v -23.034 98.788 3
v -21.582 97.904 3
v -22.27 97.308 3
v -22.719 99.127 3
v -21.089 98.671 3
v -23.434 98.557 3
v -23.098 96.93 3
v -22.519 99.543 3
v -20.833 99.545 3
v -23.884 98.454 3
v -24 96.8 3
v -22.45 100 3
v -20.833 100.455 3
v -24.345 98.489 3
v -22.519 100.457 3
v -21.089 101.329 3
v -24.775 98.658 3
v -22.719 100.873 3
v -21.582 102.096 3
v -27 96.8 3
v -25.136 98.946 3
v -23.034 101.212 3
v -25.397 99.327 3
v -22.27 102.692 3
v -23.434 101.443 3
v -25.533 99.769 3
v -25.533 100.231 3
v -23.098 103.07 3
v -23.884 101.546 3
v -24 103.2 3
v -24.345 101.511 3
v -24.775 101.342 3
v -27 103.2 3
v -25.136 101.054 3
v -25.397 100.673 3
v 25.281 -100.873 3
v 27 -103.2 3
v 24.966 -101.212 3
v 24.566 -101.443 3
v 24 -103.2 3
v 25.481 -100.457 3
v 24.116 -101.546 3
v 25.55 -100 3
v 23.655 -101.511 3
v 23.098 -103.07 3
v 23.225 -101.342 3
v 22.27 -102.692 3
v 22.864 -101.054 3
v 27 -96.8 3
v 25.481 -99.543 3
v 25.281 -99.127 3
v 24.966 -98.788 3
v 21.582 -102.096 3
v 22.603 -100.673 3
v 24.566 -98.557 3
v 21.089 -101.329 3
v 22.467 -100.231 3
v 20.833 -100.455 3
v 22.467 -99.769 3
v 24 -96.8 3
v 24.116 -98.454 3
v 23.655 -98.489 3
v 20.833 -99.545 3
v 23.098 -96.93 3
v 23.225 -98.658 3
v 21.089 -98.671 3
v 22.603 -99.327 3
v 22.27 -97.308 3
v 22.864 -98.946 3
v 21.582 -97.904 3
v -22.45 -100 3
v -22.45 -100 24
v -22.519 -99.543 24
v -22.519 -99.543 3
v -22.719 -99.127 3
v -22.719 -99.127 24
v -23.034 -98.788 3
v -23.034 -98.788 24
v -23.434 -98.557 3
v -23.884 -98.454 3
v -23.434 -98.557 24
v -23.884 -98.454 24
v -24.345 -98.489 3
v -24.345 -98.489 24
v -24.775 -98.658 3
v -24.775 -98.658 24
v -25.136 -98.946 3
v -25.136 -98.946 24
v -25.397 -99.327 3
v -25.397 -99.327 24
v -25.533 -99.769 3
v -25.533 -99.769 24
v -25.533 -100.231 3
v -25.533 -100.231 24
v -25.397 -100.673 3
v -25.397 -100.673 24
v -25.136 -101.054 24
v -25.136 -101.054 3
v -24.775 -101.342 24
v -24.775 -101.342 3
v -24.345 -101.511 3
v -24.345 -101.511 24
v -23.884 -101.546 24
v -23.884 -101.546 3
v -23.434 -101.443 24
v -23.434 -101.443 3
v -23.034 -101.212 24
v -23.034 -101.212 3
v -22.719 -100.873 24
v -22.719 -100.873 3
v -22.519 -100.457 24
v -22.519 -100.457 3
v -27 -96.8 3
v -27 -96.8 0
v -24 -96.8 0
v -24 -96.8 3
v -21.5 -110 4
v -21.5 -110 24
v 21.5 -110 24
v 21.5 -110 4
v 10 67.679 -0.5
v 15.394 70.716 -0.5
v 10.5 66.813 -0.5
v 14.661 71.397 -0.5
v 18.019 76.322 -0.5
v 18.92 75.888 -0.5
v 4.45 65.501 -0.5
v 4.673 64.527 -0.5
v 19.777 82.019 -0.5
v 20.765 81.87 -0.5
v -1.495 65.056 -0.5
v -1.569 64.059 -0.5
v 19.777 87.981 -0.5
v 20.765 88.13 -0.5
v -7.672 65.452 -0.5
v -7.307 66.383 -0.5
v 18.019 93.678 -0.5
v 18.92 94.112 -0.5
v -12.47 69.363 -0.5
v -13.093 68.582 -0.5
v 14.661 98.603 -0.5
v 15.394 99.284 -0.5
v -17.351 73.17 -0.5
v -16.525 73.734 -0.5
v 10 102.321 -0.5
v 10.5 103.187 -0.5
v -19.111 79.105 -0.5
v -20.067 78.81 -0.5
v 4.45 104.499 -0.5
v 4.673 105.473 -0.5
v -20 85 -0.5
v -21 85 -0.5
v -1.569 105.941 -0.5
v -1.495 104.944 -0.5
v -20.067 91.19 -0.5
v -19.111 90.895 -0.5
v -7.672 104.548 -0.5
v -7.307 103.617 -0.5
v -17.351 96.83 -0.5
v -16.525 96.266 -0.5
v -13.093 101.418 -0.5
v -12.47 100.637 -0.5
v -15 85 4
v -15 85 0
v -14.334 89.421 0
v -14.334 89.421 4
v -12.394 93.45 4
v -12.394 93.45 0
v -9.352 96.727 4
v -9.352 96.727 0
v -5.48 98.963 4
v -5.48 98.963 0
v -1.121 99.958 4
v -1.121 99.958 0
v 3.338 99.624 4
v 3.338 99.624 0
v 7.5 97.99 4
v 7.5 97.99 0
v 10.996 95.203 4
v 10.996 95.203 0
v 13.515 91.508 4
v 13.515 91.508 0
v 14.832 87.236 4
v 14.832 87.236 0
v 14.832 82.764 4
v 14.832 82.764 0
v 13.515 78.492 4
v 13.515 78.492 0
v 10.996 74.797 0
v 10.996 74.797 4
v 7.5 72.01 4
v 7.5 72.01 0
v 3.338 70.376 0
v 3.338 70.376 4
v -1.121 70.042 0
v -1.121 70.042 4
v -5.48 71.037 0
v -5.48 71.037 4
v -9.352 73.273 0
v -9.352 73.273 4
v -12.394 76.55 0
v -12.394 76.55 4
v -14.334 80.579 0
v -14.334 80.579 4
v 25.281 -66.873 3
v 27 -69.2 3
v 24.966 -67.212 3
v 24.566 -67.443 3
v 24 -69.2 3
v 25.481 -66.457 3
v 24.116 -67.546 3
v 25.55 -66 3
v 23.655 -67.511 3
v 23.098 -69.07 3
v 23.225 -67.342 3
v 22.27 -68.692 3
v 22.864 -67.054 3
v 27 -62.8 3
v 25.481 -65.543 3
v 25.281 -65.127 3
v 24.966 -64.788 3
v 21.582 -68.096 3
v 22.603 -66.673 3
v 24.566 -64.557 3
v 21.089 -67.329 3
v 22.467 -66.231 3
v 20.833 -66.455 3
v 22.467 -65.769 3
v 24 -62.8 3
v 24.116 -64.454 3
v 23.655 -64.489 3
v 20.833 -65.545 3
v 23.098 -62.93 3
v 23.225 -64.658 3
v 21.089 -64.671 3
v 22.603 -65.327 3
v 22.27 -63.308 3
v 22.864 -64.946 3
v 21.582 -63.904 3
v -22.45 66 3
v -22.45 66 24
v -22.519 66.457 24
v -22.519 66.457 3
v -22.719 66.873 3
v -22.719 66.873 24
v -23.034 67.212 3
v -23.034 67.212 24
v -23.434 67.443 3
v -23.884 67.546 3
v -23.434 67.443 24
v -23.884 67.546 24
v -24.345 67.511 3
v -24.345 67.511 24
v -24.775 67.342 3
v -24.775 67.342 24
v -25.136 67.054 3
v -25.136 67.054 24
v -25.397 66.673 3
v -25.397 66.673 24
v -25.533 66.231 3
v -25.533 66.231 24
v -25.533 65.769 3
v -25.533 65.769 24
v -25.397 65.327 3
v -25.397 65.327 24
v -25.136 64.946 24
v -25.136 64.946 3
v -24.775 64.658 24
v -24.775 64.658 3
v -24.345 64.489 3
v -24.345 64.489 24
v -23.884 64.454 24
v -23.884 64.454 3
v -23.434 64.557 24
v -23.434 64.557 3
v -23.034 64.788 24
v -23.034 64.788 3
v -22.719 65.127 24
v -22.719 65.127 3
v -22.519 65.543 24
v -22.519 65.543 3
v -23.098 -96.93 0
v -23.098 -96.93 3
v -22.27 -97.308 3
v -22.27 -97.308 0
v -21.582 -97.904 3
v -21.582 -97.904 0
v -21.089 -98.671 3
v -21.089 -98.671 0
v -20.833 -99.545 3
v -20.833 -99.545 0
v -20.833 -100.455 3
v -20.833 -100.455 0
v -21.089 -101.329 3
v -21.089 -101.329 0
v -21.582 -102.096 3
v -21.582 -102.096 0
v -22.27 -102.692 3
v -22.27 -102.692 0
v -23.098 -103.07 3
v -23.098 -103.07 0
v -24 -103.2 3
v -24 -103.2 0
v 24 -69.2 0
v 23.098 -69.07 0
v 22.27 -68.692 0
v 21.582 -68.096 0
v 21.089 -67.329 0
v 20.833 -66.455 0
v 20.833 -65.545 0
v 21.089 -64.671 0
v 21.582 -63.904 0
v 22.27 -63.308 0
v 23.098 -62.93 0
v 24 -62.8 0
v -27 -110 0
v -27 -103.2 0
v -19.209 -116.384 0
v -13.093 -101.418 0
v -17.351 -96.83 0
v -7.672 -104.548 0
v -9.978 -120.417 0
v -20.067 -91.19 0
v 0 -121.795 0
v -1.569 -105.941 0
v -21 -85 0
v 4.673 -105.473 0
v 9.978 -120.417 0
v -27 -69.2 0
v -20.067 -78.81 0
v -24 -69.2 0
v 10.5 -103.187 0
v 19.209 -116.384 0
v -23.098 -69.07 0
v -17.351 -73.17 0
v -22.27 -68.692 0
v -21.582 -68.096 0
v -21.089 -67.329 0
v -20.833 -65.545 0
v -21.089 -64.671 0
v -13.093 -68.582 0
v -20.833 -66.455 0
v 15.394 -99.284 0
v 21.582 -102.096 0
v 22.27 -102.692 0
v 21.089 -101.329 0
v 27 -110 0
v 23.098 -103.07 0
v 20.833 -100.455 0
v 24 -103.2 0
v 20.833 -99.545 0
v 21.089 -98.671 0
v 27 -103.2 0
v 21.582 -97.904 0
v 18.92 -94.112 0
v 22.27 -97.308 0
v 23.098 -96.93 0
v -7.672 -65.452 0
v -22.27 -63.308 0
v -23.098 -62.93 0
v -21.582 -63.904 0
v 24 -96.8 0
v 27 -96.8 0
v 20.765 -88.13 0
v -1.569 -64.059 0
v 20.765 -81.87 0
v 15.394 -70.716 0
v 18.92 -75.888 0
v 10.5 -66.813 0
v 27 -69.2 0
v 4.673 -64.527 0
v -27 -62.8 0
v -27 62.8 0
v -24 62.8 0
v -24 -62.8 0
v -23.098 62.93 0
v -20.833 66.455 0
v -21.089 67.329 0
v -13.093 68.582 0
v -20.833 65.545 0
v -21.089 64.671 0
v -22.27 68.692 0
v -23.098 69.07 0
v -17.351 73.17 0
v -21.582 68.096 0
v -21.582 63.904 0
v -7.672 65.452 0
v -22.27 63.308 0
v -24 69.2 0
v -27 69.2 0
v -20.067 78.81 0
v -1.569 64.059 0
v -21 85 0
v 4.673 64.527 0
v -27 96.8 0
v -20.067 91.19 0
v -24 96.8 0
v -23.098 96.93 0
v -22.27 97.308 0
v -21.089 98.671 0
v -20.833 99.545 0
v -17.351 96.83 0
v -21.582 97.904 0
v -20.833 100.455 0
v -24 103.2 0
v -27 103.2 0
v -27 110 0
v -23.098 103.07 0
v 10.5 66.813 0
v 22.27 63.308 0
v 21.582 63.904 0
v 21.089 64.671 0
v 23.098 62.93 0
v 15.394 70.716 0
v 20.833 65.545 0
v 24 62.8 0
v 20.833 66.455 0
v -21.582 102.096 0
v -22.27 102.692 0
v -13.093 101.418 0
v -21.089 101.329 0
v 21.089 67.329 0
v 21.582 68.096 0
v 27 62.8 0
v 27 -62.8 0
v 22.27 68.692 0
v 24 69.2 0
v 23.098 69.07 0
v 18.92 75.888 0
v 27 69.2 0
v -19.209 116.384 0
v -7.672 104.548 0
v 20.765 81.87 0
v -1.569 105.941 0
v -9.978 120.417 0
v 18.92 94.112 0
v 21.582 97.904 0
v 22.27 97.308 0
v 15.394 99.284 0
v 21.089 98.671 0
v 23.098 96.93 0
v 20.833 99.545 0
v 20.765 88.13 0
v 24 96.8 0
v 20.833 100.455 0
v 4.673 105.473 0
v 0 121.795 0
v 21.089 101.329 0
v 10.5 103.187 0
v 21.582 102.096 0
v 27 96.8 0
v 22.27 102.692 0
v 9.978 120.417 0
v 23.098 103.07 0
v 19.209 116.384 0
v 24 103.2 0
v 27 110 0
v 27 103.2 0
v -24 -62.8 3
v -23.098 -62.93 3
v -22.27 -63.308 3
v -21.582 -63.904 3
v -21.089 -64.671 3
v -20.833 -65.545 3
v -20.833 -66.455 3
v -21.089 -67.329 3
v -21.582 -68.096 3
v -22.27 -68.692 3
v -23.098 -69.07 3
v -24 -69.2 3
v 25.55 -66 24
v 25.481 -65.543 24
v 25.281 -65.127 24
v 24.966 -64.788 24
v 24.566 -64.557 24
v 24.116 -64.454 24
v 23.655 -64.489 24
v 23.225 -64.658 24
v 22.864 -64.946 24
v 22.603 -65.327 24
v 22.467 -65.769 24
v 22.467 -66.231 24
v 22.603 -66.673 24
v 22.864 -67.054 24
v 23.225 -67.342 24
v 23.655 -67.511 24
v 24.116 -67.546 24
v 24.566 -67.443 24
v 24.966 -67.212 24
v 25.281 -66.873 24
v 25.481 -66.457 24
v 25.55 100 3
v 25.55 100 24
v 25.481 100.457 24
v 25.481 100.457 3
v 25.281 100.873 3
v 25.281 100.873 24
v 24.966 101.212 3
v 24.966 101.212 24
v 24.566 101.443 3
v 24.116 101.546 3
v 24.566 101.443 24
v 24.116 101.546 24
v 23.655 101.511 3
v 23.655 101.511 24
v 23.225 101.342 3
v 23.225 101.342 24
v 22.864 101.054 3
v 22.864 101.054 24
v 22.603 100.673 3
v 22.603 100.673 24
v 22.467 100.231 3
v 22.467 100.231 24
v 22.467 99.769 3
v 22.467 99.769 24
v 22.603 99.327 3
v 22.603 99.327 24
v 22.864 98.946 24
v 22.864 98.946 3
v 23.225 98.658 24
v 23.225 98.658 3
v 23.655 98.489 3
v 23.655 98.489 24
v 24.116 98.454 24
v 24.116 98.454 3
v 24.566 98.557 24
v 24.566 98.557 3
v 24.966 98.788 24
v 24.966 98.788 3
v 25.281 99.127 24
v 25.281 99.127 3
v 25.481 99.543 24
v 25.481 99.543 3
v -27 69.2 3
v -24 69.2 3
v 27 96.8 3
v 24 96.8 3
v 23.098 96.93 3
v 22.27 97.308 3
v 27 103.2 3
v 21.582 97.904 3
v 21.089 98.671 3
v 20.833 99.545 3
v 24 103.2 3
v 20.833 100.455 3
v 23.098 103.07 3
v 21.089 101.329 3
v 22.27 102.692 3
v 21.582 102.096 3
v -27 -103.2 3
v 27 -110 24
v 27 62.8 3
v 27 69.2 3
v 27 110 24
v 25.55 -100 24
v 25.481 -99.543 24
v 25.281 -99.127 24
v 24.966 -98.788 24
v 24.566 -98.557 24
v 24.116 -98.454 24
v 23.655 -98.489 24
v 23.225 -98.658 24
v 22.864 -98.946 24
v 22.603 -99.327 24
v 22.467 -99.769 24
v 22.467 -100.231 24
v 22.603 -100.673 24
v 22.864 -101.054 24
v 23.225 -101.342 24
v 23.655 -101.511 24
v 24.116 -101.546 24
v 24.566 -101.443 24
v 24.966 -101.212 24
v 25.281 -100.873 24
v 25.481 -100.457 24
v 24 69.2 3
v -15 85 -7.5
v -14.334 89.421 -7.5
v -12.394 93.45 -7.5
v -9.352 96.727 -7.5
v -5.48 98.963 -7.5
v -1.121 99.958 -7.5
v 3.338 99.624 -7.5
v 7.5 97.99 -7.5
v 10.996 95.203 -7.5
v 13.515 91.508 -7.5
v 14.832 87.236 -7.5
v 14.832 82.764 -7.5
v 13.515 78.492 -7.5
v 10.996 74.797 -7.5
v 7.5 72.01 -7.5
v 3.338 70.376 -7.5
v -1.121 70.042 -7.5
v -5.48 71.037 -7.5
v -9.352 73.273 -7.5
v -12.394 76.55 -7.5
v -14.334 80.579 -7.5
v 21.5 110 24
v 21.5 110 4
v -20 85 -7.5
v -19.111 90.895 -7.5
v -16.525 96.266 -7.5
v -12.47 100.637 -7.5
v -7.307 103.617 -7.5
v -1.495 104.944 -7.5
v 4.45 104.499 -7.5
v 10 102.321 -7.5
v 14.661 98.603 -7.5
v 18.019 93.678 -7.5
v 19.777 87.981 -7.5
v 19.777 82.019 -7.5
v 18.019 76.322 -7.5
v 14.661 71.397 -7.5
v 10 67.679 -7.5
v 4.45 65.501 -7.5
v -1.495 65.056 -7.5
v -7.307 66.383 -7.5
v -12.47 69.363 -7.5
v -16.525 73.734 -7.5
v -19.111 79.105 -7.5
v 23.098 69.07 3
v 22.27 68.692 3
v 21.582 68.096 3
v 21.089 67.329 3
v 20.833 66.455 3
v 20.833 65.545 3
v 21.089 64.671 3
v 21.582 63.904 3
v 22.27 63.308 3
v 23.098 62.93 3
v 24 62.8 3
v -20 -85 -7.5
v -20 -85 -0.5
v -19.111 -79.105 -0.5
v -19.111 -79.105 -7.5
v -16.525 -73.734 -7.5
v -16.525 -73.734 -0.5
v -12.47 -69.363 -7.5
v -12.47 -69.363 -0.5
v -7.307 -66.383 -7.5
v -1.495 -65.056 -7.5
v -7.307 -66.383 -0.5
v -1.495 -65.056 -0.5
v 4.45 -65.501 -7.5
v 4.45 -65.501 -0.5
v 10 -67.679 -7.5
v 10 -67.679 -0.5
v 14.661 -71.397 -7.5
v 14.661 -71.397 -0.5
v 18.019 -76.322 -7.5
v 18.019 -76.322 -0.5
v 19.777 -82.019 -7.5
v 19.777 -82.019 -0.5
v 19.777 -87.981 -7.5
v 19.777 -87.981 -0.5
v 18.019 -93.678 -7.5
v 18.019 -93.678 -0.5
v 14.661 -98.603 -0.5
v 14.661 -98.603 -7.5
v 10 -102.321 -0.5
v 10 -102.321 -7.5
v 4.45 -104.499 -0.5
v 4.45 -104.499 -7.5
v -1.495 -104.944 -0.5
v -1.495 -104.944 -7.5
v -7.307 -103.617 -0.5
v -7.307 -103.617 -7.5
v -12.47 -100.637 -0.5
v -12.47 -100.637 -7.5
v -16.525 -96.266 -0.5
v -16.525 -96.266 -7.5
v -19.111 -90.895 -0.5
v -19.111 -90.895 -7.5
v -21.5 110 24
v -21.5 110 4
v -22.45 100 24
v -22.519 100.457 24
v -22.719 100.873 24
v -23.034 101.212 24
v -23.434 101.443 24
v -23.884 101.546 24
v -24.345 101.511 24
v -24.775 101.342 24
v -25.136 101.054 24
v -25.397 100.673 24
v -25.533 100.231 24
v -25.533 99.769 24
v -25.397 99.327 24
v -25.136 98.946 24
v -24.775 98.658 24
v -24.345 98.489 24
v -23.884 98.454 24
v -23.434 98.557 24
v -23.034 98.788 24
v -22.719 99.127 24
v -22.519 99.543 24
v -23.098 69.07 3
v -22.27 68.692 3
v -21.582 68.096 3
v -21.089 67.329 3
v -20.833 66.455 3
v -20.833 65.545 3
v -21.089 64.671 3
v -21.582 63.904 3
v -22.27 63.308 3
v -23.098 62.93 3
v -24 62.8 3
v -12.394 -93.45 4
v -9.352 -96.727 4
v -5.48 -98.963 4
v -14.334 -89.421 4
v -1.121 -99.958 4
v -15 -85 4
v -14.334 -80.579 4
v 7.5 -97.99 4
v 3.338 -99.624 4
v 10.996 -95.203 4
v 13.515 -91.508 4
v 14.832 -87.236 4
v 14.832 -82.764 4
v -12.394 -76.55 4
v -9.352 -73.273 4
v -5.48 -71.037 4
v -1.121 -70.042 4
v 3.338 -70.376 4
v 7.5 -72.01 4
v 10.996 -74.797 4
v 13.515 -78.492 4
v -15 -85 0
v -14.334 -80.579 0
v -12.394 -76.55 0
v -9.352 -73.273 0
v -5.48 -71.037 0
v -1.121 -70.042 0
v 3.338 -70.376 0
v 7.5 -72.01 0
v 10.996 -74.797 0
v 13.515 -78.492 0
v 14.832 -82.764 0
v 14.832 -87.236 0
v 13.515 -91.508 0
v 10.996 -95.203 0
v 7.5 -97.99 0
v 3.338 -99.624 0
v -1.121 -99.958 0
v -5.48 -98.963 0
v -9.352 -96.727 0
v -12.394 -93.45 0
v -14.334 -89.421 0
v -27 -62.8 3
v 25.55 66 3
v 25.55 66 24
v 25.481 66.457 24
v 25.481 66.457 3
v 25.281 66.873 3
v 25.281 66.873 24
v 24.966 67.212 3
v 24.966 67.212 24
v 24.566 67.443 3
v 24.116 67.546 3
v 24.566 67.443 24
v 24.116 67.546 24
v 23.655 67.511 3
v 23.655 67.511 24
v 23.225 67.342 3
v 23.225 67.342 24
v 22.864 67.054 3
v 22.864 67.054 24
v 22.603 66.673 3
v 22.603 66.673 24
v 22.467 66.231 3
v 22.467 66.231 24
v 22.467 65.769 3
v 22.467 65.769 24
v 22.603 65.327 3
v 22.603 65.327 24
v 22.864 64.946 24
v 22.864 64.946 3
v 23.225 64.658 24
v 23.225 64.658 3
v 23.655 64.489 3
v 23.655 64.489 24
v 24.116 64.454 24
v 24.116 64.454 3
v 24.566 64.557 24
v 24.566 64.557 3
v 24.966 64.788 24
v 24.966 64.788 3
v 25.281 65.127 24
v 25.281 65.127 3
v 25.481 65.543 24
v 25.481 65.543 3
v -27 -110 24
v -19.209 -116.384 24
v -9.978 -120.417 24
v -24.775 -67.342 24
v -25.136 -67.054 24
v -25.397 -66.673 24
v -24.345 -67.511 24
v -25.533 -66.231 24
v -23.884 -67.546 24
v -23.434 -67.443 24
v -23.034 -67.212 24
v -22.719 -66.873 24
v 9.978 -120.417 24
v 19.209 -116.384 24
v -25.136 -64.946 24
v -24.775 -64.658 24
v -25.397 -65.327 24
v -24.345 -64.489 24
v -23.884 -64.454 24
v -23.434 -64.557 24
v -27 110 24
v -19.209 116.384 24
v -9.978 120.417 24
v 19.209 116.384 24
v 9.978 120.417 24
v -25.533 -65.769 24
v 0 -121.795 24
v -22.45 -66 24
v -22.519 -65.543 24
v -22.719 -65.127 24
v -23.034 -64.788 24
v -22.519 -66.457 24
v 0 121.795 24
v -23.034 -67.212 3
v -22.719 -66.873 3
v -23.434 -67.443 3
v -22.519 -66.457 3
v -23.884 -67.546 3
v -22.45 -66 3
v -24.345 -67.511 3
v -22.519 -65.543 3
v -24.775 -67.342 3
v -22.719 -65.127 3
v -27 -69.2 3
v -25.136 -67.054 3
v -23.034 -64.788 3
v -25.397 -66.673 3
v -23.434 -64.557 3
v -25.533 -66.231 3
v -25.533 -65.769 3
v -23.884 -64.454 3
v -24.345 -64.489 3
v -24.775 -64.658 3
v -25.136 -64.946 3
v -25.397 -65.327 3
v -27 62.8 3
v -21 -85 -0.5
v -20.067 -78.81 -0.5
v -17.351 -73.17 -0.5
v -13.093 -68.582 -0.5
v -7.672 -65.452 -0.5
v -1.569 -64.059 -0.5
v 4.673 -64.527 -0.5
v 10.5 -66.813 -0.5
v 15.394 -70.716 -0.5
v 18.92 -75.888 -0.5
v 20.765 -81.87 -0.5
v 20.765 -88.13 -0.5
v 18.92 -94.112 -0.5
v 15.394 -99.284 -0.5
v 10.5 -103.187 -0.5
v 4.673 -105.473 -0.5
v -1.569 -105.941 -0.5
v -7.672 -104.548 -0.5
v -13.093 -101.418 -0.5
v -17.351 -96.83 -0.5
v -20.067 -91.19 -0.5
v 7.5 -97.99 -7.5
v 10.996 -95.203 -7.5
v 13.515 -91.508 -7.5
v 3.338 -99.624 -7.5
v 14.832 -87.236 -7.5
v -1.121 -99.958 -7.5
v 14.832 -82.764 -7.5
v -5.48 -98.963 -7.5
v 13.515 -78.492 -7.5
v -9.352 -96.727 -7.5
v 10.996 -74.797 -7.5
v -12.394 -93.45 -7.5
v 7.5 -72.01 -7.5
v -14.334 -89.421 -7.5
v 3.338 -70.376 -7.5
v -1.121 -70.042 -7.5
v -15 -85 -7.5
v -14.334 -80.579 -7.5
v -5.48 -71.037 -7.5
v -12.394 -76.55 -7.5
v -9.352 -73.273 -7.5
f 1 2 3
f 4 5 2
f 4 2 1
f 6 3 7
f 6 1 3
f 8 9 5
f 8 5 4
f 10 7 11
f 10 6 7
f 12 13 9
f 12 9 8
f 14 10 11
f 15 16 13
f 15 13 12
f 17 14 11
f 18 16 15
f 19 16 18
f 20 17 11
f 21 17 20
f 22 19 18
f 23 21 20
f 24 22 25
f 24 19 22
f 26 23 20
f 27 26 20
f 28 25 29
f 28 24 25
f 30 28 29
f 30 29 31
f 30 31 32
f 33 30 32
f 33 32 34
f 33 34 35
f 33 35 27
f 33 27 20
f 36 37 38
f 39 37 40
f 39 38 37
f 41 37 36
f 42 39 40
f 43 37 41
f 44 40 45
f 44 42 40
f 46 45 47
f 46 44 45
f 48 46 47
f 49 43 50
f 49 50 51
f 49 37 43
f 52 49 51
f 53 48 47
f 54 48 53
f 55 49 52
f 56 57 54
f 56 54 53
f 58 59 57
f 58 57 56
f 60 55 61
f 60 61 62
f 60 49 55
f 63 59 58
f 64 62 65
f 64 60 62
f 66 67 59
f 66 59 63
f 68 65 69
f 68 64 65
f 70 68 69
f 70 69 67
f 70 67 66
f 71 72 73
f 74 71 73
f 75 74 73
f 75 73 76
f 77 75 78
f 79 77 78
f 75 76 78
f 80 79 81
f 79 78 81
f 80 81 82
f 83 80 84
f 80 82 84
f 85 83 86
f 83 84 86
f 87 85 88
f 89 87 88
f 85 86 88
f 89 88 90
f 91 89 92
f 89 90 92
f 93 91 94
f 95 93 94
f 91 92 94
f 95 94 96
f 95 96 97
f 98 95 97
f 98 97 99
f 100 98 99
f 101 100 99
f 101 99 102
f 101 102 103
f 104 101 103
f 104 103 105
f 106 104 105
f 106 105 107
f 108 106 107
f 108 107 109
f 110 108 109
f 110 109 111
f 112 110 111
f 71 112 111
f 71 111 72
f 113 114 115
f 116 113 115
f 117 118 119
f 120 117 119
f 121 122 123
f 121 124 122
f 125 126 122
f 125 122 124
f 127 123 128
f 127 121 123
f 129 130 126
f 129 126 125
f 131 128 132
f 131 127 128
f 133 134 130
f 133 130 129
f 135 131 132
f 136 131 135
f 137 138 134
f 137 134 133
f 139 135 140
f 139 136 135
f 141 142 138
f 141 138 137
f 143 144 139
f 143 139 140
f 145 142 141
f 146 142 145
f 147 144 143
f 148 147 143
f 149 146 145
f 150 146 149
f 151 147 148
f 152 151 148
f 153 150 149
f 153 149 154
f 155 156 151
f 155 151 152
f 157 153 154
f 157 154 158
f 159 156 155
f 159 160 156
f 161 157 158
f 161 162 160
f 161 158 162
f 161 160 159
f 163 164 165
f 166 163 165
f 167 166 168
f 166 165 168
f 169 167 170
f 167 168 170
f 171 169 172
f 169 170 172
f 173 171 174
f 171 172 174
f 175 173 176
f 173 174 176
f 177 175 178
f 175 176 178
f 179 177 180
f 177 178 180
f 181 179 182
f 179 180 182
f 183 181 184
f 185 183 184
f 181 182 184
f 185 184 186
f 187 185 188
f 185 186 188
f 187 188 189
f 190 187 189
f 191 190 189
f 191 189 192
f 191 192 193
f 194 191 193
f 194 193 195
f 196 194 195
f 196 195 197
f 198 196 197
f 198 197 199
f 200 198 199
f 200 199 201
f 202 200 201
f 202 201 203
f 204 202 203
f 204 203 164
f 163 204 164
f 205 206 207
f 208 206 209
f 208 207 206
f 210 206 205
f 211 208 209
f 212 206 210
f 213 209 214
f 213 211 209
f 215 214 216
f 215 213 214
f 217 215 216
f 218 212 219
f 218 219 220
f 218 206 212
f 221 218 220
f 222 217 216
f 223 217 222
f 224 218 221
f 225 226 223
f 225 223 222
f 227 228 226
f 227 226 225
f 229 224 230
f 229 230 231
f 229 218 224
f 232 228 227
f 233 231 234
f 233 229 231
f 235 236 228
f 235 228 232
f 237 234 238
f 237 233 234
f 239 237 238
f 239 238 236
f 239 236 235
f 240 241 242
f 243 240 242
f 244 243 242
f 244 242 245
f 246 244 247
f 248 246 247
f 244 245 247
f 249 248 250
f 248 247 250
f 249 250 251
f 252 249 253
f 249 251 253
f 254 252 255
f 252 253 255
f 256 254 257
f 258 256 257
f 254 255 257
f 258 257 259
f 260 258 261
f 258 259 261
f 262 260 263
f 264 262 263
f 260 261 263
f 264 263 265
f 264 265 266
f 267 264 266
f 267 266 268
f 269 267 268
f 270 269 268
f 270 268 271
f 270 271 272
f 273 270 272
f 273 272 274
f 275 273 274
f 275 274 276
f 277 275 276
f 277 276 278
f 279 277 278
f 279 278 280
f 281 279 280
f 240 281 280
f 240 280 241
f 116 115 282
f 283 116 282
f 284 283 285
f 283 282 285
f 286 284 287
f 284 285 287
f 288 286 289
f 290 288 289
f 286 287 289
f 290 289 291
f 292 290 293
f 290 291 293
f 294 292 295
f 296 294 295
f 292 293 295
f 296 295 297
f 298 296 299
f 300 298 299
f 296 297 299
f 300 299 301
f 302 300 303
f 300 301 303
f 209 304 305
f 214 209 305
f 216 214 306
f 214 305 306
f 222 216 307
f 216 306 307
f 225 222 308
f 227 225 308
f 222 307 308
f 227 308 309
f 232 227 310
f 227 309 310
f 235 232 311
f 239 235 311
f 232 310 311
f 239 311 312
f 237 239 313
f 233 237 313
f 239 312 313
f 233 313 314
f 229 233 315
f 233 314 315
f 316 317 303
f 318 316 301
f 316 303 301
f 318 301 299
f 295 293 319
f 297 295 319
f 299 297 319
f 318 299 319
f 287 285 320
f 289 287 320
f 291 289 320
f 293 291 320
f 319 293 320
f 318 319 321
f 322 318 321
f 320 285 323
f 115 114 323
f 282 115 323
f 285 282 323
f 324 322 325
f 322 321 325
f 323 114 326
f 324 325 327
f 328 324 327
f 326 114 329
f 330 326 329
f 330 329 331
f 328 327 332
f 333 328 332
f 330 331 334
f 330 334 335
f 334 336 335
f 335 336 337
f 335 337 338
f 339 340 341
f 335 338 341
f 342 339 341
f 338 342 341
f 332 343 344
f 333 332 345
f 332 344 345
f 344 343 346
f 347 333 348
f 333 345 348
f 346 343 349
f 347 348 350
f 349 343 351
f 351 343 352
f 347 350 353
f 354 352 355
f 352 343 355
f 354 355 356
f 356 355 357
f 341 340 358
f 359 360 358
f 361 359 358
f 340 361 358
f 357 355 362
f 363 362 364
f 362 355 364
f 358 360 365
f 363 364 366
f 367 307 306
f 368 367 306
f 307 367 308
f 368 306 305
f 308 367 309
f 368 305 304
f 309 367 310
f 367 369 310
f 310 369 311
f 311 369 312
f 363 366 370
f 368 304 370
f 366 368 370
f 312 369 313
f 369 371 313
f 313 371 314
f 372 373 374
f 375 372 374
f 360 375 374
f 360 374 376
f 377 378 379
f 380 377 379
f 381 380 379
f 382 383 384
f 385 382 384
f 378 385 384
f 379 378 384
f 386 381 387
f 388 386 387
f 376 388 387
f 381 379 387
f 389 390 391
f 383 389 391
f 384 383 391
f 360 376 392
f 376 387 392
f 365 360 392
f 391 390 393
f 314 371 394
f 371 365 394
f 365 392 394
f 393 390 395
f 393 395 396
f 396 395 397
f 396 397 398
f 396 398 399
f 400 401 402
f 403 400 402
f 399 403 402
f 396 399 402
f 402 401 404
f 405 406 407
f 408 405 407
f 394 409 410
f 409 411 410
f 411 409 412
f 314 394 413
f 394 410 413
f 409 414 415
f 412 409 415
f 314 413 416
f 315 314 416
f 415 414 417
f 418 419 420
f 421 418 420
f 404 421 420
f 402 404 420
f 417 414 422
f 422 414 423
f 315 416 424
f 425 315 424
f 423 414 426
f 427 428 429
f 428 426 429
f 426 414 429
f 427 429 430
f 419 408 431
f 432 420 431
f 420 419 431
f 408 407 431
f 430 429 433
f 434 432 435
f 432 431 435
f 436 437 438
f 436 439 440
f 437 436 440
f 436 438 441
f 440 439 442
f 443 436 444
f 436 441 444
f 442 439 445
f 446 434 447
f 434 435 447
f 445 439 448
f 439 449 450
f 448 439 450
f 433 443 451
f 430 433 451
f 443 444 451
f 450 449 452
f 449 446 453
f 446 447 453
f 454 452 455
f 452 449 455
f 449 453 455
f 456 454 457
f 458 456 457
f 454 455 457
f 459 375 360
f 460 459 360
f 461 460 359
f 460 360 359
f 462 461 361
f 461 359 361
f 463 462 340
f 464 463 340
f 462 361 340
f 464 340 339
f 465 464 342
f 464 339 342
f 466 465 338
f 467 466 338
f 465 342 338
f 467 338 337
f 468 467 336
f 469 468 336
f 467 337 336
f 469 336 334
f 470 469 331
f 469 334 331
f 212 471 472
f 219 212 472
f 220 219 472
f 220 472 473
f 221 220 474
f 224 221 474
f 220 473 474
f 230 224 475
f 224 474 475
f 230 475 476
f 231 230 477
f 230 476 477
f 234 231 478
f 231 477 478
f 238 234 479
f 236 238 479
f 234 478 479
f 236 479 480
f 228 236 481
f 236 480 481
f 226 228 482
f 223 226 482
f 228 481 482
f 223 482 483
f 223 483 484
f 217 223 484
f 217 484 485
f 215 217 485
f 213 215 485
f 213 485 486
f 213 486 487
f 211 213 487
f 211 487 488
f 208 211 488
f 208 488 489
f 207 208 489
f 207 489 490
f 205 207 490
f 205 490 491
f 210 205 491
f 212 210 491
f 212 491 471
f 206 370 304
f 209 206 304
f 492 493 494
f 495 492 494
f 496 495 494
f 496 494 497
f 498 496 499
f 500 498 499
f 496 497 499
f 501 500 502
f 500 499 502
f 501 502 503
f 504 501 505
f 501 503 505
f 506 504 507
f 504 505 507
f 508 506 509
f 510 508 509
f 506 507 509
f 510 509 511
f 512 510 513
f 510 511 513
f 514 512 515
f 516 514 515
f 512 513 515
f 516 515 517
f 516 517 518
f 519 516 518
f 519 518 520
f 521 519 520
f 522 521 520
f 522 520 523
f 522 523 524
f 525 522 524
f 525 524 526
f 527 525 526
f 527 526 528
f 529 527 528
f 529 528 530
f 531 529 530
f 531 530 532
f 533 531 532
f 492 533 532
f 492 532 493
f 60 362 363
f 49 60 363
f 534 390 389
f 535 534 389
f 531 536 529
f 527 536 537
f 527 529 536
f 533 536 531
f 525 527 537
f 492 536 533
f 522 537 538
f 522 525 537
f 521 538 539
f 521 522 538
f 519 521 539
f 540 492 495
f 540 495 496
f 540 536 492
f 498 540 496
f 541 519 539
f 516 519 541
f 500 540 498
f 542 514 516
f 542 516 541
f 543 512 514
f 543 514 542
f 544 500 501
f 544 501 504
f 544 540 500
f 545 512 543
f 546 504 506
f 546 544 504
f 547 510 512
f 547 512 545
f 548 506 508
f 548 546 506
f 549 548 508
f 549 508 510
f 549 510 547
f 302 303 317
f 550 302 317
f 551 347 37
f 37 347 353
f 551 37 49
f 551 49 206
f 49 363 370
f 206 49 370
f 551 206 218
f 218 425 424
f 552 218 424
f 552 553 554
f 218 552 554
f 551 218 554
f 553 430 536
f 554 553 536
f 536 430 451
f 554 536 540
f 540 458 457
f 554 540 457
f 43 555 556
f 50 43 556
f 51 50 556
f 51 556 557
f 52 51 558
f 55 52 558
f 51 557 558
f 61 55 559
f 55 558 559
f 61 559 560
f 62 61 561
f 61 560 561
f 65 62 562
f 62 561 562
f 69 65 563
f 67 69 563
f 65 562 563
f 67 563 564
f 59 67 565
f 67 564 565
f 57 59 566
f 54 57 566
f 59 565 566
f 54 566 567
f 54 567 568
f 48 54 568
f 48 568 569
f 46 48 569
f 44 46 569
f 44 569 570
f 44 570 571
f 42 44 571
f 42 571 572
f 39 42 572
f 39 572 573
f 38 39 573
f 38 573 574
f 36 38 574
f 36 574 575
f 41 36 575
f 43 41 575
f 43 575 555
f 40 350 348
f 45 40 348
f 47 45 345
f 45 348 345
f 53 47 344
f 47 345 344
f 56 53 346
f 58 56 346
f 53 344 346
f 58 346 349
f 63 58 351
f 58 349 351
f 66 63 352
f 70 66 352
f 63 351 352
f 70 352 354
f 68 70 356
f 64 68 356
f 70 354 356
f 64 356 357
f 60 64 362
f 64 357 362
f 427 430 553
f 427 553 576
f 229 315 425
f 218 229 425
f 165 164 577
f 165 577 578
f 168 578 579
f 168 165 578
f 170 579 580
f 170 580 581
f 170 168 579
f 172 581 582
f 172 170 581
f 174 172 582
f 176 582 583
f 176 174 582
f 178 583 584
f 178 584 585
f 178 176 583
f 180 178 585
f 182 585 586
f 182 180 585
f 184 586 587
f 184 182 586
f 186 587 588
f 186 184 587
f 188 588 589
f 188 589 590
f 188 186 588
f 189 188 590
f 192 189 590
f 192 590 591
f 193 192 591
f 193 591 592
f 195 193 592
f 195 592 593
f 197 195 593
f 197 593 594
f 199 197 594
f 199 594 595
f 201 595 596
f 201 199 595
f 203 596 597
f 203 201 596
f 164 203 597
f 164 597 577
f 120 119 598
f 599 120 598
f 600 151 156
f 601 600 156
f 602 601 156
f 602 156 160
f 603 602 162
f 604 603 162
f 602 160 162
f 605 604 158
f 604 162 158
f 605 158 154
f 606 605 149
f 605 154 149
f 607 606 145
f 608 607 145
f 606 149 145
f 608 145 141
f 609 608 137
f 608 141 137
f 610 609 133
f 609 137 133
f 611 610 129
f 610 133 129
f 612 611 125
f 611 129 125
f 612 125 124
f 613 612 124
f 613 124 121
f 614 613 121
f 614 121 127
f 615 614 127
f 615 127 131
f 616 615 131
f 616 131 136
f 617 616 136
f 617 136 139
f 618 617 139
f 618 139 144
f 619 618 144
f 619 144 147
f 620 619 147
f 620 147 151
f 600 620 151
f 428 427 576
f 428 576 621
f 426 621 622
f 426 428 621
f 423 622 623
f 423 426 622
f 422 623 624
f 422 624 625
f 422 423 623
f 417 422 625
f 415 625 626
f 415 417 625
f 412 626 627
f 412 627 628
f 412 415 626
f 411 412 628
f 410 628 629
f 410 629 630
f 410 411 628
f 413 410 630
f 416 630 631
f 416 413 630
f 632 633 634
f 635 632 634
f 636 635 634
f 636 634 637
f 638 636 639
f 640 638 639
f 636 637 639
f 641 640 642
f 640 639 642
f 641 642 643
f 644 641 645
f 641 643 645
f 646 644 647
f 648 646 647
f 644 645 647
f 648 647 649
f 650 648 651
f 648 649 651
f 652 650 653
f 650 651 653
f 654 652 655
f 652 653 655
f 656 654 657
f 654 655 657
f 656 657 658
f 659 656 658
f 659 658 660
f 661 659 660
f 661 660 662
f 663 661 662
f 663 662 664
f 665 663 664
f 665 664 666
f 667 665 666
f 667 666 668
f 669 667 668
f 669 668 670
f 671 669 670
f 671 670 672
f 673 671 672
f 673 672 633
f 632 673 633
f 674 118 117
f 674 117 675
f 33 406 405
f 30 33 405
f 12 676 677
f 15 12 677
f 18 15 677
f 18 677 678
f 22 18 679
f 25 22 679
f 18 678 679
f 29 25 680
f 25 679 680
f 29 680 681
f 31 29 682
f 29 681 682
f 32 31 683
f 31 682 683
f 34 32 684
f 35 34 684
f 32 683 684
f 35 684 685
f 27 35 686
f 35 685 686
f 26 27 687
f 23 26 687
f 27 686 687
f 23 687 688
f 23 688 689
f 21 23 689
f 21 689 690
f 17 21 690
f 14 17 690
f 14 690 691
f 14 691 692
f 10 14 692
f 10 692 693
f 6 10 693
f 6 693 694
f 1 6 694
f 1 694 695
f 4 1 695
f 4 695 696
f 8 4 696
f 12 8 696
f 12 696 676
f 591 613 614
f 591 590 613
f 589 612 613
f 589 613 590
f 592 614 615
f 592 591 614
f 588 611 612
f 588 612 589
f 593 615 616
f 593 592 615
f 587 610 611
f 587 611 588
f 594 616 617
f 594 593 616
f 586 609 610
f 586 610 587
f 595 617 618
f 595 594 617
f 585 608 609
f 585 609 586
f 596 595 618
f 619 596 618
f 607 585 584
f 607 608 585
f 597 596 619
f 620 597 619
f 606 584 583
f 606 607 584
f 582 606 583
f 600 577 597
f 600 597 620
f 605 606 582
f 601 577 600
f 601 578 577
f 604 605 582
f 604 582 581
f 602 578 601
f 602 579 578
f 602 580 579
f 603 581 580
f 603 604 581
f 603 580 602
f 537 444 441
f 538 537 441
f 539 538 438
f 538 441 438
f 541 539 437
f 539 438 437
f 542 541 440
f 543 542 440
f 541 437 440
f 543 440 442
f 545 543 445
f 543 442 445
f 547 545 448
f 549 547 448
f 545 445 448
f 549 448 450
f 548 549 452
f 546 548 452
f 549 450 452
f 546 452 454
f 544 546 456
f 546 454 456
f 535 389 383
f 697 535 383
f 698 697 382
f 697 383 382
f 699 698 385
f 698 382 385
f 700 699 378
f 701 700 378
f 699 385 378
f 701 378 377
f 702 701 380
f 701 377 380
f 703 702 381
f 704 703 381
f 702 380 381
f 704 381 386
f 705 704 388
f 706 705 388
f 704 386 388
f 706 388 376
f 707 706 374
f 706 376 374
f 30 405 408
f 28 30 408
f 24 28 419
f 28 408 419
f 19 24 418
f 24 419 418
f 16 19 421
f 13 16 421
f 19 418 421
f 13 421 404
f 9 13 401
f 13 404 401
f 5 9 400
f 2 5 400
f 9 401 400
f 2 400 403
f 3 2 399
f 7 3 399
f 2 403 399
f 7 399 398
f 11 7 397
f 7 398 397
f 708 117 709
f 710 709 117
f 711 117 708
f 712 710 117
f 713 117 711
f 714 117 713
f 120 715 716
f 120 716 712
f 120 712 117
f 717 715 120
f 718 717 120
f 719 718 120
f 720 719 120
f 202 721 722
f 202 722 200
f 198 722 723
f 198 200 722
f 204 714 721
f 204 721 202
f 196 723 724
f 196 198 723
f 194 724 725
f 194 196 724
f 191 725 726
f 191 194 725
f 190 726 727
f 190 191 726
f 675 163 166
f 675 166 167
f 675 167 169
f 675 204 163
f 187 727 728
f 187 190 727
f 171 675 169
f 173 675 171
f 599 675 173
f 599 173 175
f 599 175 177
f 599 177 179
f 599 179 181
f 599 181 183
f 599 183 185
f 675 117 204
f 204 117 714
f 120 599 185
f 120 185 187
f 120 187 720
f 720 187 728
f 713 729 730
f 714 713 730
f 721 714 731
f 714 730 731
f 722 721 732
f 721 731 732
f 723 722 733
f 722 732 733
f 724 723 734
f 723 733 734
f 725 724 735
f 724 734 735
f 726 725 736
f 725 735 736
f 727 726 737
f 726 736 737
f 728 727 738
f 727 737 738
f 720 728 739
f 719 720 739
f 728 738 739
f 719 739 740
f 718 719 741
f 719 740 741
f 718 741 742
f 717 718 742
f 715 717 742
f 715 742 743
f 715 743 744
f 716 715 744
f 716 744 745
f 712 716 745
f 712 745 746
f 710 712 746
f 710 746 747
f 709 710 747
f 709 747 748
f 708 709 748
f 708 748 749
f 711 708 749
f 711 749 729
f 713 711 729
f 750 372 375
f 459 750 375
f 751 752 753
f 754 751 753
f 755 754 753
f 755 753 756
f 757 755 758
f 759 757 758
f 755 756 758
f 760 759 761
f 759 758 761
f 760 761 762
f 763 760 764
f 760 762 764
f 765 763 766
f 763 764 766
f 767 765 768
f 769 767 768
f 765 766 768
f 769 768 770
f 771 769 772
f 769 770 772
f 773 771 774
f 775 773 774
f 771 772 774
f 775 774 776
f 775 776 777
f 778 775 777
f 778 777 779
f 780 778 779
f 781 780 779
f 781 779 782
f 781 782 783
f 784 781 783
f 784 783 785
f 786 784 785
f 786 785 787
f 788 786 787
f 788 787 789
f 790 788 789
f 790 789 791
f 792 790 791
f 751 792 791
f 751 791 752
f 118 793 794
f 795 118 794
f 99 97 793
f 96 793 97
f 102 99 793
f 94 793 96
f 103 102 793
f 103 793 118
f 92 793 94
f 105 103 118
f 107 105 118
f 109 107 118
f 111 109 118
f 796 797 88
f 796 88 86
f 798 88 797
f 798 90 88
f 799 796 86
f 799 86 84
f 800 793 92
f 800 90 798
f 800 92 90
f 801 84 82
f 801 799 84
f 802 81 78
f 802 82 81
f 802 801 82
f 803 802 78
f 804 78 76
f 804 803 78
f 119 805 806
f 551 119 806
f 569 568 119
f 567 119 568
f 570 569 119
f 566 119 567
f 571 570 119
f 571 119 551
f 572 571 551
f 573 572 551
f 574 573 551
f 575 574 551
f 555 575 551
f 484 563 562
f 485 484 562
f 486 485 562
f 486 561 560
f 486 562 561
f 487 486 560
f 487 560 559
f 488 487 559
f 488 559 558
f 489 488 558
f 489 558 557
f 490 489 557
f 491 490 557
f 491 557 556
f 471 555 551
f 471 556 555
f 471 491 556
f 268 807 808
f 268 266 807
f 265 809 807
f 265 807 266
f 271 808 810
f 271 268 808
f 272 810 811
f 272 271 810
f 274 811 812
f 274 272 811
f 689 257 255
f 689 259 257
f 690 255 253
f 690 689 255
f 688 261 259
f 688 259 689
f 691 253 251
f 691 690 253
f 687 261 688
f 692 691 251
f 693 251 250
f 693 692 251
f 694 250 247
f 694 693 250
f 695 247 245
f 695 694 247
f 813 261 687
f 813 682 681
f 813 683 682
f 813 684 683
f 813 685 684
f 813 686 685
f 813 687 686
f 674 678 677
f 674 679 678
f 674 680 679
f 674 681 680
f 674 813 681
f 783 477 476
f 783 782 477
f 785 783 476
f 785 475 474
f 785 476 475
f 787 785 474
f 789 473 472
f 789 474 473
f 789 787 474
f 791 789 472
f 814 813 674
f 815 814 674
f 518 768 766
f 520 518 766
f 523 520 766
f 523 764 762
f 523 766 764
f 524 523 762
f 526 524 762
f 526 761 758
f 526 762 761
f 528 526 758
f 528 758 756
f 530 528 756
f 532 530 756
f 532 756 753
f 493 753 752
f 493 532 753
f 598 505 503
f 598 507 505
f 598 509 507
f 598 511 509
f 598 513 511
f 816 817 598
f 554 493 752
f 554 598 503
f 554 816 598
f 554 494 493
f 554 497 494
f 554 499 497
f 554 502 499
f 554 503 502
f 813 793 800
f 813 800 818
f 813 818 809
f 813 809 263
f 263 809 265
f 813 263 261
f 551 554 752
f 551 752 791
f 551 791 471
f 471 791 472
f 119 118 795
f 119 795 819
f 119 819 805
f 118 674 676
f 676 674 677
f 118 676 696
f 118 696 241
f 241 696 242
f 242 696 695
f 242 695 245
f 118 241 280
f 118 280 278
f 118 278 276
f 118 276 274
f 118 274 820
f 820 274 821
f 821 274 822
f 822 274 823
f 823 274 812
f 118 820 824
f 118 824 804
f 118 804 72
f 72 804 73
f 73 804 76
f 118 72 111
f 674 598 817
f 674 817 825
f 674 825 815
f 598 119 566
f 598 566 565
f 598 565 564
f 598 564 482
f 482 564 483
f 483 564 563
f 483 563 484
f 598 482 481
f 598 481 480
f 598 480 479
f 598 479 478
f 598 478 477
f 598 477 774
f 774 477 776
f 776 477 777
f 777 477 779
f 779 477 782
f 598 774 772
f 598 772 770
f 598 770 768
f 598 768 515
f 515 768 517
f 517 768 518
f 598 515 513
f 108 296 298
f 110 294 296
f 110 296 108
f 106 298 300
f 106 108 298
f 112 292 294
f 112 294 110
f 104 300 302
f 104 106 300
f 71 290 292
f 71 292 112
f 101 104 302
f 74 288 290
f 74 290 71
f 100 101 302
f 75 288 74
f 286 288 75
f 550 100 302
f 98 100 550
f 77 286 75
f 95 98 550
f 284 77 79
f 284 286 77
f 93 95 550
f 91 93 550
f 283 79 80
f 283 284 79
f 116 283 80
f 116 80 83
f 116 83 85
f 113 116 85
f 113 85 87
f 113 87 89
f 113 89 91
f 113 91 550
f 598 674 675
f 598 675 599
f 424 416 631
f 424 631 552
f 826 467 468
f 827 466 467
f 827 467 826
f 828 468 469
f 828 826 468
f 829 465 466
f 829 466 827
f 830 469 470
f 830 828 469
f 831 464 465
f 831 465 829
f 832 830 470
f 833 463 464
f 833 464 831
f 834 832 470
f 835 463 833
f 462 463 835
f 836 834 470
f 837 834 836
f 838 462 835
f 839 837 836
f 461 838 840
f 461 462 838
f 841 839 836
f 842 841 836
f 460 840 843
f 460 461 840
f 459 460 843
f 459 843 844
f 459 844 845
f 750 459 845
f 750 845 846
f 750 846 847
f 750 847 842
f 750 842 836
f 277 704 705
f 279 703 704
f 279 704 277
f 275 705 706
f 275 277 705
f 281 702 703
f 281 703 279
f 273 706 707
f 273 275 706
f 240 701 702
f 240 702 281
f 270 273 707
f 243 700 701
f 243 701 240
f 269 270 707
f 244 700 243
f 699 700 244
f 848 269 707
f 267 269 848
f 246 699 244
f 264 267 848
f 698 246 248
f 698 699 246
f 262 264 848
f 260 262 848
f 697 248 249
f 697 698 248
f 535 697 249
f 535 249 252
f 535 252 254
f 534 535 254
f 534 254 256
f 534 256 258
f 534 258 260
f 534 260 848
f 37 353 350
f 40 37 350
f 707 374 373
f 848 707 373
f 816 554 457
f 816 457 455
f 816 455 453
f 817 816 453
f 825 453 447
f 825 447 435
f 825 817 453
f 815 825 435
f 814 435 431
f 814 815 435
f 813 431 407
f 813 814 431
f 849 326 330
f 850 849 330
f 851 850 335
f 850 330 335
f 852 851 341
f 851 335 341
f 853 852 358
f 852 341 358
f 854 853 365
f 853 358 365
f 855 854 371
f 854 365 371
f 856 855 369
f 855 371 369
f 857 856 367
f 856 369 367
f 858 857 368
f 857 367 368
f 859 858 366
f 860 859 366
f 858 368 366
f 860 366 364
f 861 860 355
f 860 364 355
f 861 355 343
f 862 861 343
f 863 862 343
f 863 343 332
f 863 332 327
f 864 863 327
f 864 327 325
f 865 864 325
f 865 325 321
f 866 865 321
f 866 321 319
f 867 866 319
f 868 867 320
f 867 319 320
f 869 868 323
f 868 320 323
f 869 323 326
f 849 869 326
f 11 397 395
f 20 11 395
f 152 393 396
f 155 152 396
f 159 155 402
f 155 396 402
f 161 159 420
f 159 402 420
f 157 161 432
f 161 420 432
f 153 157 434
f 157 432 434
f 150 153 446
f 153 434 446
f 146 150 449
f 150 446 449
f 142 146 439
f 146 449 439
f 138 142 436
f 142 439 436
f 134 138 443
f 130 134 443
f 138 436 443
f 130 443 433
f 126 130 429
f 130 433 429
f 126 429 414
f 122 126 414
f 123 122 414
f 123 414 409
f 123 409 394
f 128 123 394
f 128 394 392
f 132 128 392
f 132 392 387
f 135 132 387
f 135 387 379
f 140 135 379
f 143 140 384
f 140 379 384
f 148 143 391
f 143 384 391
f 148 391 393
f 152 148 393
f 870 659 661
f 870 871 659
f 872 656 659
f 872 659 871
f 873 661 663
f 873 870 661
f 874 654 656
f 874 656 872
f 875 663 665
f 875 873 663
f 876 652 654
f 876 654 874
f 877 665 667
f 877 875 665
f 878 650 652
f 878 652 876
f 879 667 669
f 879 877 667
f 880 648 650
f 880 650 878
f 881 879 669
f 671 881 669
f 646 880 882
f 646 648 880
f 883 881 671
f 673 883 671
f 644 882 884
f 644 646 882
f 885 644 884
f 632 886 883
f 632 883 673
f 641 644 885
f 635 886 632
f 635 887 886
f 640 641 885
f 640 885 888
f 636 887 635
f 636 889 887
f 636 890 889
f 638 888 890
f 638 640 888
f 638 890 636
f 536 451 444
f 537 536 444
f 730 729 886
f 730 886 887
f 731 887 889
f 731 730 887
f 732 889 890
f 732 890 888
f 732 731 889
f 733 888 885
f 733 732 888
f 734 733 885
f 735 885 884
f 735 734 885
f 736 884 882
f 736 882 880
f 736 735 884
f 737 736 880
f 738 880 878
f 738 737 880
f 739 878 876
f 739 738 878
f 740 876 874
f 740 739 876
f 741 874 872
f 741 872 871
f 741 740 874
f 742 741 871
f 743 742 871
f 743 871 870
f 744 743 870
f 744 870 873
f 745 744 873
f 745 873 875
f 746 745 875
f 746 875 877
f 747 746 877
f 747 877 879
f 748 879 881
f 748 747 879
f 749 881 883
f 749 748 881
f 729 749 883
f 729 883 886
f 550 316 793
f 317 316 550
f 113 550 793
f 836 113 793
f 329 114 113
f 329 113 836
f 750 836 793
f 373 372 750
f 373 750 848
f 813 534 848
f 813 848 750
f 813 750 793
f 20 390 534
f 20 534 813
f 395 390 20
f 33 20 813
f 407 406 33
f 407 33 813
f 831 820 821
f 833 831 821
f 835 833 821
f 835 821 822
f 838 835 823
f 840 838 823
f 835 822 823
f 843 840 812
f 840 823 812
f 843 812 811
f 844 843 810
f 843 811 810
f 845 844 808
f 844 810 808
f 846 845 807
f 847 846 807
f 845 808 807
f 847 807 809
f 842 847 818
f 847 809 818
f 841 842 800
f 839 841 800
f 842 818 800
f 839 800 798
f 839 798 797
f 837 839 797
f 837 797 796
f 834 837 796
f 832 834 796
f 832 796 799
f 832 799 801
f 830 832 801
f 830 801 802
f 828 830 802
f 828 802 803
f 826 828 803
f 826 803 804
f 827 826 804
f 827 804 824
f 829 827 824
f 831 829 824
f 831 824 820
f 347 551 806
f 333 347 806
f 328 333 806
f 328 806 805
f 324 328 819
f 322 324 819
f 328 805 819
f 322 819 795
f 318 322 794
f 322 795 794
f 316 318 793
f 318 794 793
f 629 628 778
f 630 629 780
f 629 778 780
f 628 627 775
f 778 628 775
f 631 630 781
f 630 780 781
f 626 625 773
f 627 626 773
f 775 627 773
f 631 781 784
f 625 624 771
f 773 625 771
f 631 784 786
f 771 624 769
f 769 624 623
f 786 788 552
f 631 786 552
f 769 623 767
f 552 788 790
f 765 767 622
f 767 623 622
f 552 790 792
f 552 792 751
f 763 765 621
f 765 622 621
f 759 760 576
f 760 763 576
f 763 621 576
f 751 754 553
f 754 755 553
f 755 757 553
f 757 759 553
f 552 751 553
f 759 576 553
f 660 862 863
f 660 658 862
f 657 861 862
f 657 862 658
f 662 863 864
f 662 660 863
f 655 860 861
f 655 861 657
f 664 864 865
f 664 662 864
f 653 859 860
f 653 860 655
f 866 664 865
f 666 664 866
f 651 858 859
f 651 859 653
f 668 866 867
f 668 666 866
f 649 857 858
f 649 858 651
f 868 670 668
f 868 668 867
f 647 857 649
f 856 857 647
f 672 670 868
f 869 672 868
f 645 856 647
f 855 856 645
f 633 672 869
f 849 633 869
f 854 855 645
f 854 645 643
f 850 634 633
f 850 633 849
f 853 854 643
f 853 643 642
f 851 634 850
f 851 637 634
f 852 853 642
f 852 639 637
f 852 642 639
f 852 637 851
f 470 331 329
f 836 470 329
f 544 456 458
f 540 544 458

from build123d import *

# Parameters (mm, degrees)
SKETCH_1_W          = 54
SKETCH_1_H          = 220
EXTRUDE_1_DEPTH     = 24
SKETCH_2_R          = 1.55
CUT_EXTRUDE_1_DEPTH = 25
EXTRUDE_2_DEPTH     = 24
SKETCH_5_W          = 43
SKETCH_5_H          = 220
CUT_EXTRUDE_3_DEPTH = 20
CUT_EXTRUDE_4_DEPTH = 3
SKETCH_7_R          = 15
CUT_EXTRUDE_5_DEPTH = 25
SKETCH_11_R         = 20
SKETCH_11_R_2       = 15
EXTRUDE_3_DEPTH     = 7.5
SKETCH_12_R         = 21
SKETCH_12_R_2       = 20
EXTRUDE_4_DEPTH     = 0.5


with BuildPart() as part:
    # 草图1 → 凸台-拉伸1 (new body)
    with BuildSketch(Plane.XY):
        Rectangle(SKETCH_1_W, SKETCH_1_H)
    extrude(amount=EXTRUDE_1_DEPTH)

    # 草图2 → 切除-拉伸1 (cut, through all)
    with BuildSketch(Plane.XY.offset(24)):
        with Locations((-24, 100)):
            Circle(SKETCH_2_R)
        with Locations((24, 100)):
            Circle(SKETCH_2_R)
        with Locations((24, 66)):
            Circle(SKETCH_2_R)
        with Locations((-24, 66)):
            Circle(SKETCH_2_R)
        with Locations((24, -100)):
            Circle(SKETCH_2_R)
        with Locations((24, -66)):
            Circle(SKETCH_2_R)
        with Locations((-24, -66)):
            Circle(SKETCH_2_R)
        with Locations((-24, -100)):
            Circle(SKETCH_2_R)
    extrude(amount=-CUT_EXTRUDE_1_DEPTH, mode=Mode.SUBTRACT)

    # 草图3 → 凸台-拉伸2 (add)
    with BuildSketch(Plane.XY.offset(24)):
        with BuildLine():
            Line((-27, 110), (27, 110))
            ThreePointArc((27, 110), (0, 121.795200461), (-27, 110))
        make_face()
        with BuildLine():
            Line((-27, -110), (27, -110))
            ThreePointArc((27, -110), (0, -121.795200461), (-27, -110))
        make_face()
    extrude(amount=-EXTRUDE_2_DEPTH)

    # 草图5 → 切除-拉伸3 (cut)
    with BuildSketch(Plane.XY.offset(24)):
        Rectangle(SKETCH_5_W, SKETCH_5_H)
    extrude(amount=-CUT_EXTRUDE_3_DEPTH, mode=Mode.SUBTRACT)

    # 草图6 → 切除-拉伸4 (cut)
    with BuildSketch(Plane(origin=(0, 0, 0), x_dir=(-1, 0, 0), z_dir=(0, 0, -1))):
        with BuildLine():
            Line((-27, 69.2), (-24, 69.2))
            ThreePointArc((-24, 69.2), (-20.8, 66), (-24, 62.8))
            Line((-24, 62.8), (-27, 62.8))
            Line((-27, 62.8), (-27, 69.2))
        make_face()
        with BuildLine():
            Line((-27, 103.2), (-27, 96.8))
            Line((-27, 96.8), (-24, 96.8))
            ThreePointArc((-24, 96.8), (-20.8, 100), (-24, 103.2))
            Line((-24, 103.2), (-27, 103.2))
        make_face()
        with BuildLine():
            Line((27, 69.2), (24, 69.2))
            ThreePointArc((24, 69.2), (20.8, 66), (24, 62.8))
            Line((24, 62.8), (27, 62.8))
            Line((27, 62.8), (27, 69.2))
        make_face()
        with BuildLine():
            Line((27, 103.2), (24, 103.2))
            ThreePointArc((24, 103.2), (20.8, 100), (24, 96.8))
            Line((24, 96.8), (27, 96.8))
            Line((27, 96.8), (27, 103.2))
        make_face()
        with BuildLine():
            Line((27, -69.2), (27, -62.8))
            Line((27, -62.8), (24, -62.8))
            ThreePointArc((24, -62.8), (20.8, -66), (24, -69.2))
            Line((24, -69.2), (27, -69.2))
        make_face()
        with BuildLine():
            Line((27, -103.2), (27, -96.8))
            Line((27, -96.8), (24, -96.8))
            ThreePointArc((24, -96.8), (20.8, -100), (24, -103.2))
            Line((24, -103.2), (27, -103.2))
        make_face()
        with BuildLine():
            Line((-27, -103.2), (-24, -103.2))
            ThreePointArc((-24, -103.2), (-20.8, -100), (-24, -96.8))
            Line((-24, -96.8), (-27, -96.8))
            Line((-27, -96.8), (-27, -103.2))
        make_face()
        with BuildLine():
            Line((-27, -69.2), (-24, -69.2))
            ThreePointArc((-24, -69.2), (-20.8, -66), (-24, -62.8))
            Line((-24, -62.8), (-27, -62.8))
            Line((-27, -62.8), (-27, -69.2))
        make_face()
    extrude(amount=-CUT_EXTRUDE_4_DEPTH, mode=Mode.SUBTRACT)

    # 草图7 → 切除-拉伸5 (cut, through all)
    with BuildSketch(Plane(origin=(0, 0, 0), x_dir=(-1, 0, 0), z_dir=(0, 0, -1))):
        with Locations((0, 85)):
            Circle(SKETCH_7_R)
        with Locations((0, -85)):
            Circle(SKETCH_7_R)
    extrude(amount=-CUT_EXTRUDE_5_DEPTH, mode=Mode.SUBTRACT)

    # 草图11 → 凸台-拉伸3 (add)
    with BuildSketch(Plane(origin=(0, 0, 0), x_dir=(-1, 0, 0), z_dir=(0, 0, -1))):
        with Locations((0, 85)):
            Circle(SKETCH_11_R)
        with Locations((0, 85)):
            Circle(SKETCH_11_R_2, mode=Mode.SUBTRACT)
        with Locations((0, -85)):
            Circle(SKETCH_11_R)
        with Locations((0, -85)):
            Circle(SKETCH_11_R_2, mode=Mode.SUBTRACT)
    extrude(amount=EXTRUDE_3_DEPTH)

    # 草图12 → 凸台-拉伸4 (add)
    with BuildSketch(Plane(origin=(0, 0, 0), x_dir=(-1, 0, 0), z_dir=(0, 0, -1))):
        with Locations((0, 85)):
            Circle(SKETCH_12_R)
        with Locations((0, 85)):
            Circle(SKETCH_12_R_2, mode=Mode.SUBTRACT)
        with Locations((0, -85)):
            Circle(SKETCH_12_R)
        with Locations((0, -85)):
            Circle(SKETCH_12_R_2, mode=Mode.SUBTRACT)
    extrude(amount=EXTRUDE_4_DEPTH)


solid = part.part
